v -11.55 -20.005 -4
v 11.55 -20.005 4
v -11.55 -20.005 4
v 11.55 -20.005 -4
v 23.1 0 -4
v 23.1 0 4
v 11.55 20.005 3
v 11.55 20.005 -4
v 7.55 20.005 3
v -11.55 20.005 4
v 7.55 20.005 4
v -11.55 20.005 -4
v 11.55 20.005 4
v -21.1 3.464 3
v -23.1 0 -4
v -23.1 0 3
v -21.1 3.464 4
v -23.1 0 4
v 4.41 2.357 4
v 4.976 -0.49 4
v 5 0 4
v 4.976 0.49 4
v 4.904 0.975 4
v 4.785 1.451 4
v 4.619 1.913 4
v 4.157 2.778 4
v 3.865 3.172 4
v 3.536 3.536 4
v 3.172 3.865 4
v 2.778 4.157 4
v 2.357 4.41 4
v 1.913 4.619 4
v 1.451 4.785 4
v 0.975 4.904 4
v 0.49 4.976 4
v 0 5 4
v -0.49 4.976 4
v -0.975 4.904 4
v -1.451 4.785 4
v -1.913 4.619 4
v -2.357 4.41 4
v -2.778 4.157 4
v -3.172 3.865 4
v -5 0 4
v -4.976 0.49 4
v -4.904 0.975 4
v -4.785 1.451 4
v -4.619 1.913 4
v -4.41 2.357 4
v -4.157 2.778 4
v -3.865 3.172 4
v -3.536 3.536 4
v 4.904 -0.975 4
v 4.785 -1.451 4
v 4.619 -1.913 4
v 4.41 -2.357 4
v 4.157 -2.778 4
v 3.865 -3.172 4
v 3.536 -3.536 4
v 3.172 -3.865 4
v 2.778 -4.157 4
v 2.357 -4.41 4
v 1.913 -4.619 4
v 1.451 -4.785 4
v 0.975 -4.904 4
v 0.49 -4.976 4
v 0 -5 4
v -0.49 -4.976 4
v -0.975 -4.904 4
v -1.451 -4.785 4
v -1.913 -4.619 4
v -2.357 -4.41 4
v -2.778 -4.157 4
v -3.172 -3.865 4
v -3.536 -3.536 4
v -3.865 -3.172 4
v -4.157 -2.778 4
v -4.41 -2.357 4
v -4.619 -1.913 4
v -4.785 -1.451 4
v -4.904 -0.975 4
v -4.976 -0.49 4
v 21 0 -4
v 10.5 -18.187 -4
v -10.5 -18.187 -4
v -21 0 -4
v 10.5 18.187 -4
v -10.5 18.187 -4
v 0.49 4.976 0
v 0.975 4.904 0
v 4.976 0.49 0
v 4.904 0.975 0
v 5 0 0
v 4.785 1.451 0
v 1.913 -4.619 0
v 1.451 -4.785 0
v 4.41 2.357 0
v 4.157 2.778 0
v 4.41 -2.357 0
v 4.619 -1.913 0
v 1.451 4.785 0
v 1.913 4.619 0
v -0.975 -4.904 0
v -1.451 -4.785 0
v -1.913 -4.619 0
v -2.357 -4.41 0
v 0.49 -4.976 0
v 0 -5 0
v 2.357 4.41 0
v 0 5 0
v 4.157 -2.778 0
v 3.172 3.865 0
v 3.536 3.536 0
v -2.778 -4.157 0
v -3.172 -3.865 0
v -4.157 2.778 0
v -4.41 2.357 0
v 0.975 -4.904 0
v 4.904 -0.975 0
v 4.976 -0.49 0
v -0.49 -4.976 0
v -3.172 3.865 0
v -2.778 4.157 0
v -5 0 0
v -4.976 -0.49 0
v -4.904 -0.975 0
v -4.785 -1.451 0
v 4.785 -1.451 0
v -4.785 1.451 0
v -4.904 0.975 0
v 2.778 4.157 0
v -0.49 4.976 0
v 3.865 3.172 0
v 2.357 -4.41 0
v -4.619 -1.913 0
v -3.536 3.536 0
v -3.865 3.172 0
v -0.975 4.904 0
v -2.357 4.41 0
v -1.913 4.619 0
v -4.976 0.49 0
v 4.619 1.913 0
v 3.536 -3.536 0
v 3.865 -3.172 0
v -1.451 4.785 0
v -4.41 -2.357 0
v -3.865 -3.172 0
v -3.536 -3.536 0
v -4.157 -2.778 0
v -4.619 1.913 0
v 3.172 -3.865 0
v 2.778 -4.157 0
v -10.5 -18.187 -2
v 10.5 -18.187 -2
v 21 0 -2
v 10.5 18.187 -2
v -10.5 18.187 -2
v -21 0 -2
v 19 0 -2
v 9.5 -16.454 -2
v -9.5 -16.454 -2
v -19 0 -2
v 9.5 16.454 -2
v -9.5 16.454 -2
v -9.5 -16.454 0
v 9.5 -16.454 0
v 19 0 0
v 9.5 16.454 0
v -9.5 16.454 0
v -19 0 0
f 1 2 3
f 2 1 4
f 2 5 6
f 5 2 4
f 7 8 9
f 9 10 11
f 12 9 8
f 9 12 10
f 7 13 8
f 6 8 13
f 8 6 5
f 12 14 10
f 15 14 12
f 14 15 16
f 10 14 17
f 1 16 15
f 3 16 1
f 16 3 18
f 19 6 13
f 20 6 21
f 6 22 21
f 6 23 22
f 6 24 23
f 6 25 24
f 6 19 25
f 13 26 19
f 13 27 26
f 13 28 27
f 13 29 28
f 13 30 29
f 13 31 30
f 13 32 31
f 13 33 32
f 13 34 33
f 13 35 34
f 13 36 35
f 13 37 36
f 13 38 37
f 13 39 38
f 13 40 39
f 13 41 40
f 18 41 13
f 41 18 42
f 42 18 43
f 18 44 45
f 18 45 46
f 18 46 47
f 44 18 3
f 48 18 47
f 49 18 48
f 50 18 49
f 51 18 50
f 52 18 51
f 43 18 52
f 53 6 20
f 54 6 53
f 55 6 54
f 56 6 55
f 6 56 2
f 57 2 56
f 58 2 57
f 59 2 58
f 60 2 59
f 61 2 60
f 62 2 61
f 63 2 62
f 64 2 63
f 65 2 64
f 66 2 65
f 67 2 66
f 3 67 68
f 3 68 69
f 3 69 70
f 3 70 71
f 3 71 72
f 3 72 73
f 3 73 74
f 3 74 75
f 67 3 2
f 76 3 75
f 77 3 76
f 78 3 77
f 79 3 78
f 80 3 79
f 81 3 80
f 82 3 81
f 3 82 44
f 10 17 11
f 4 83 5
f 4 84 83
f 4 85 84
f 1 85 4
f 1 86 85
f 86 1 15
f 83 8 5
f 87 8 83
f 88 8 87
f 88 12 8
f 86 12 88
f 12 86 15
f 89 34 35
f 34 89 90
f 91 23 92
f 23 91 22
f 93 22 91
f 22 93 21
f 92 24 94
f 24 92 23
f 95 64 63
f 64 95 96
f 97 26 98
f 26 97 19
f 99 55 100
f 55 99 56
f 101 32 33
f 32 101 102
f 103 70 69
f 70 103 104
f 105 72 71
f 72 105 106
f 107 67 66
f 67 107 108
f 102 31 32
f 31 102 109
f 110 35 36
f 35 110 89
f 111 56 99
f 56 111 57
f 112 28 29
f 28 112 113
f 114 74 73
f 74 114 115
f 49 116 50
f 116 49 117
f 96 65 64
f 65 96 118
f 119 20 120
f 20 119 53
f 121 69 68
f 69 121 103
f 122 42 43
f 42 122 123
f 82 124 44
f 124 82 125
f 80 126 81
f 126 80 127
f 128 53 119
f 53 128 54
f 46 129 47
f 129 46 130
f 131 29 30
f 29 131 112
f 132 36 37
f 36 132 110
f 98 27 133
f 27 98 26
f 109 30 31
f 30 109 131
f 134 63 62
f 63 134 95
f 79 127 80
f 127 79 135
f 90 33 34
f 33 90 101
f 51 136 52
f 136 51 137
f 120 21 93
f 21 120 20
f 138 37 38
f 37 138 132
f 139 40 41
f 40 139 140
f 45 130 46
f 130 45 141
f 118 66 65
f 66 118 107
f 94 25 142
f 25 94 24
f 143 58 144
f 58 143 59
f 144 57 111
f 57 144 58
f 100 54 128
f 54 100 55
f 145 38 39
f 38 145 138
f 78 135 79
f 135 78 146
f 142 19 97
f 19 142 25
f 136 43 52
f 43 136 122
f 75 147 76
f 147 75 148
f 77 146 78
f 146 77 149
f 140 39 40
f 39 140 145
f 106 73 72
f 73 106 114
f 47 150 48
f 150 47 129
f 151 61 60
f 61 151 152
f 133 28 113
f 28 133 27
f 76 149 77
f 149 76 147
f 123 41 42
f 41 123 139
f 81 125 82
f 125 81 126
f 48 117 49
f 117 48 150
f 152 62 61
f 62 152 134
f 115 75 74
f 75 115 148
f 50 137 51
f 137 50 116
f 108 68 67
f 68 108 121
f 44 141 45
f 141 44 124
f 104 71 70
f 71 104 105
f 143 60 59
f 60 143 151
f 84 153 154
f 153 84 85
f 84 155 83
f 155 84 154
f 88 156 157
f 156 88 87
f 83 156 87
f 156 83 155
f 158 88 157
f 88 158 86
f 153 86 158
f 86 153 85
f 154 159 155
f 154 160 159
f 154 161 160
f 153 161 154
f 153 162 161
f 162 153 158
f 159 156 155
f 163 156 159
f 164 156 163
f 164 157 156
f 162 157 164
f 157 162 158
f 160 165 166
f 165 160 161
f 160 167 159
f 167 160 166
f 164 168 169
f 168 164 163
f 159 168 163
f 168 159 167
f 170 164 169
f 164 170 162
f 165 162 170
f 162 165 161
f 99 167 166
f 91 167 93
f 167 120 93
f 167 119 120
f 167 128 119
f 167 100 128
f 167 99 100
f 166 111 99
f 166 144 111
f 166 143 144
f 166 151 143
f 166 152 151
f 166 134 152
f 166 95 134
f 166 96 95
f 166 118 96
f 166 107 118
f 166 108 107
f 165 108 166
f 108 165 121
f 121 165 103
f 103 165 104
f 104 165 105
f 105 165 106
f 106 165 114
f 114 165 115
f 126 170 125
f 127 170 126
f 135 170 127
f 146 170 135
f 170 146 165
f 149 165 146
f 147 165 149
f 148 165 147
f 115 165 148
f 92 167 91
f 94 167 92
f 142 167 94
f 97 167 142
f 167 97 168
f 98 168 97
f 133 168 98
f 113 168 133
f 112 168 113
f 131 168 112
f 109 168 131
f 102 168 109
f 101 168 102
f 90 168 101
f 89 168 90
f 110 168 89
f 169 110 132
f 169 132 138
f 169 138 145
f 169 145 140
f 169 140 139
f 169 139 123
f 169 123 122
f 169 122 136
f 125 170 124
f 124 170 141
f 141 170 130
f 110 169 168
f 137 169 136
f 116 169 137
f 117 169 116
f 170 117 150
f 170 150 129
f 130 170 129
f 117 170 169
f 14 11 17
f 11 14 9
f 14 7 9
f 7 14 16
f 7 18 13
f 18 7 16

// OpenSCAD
module hexagonal_plate() {
    difference() {
        // Hexagonal plate
        translate([0, 0, -4])
        cylinder(h=8, r=23.1, $fn=6);
        
        // Circular through-hole
        translate([0, 0, -10])
        cylinder(h=20, r=5, $fn=64);
        
        // Step-like thickness changes
        translate([0, 0, -4])
        cylinder(h=2, r=21, $fn=6);
        
        translate([0, 0, -4])
        cylinder(h=4, r=19, $fn=6);
        
        // Diagonal grooves
        translate([-23.1, 0, 3])
        rotate([0, 0, 30])
        cube([46.2, 2, 1]);
        
        translate([-23.1, 0, 5])
        rotate([0, 0, 30])
        cube([46.2, 2, 1]);
    }
}

hexagonal_plate();
